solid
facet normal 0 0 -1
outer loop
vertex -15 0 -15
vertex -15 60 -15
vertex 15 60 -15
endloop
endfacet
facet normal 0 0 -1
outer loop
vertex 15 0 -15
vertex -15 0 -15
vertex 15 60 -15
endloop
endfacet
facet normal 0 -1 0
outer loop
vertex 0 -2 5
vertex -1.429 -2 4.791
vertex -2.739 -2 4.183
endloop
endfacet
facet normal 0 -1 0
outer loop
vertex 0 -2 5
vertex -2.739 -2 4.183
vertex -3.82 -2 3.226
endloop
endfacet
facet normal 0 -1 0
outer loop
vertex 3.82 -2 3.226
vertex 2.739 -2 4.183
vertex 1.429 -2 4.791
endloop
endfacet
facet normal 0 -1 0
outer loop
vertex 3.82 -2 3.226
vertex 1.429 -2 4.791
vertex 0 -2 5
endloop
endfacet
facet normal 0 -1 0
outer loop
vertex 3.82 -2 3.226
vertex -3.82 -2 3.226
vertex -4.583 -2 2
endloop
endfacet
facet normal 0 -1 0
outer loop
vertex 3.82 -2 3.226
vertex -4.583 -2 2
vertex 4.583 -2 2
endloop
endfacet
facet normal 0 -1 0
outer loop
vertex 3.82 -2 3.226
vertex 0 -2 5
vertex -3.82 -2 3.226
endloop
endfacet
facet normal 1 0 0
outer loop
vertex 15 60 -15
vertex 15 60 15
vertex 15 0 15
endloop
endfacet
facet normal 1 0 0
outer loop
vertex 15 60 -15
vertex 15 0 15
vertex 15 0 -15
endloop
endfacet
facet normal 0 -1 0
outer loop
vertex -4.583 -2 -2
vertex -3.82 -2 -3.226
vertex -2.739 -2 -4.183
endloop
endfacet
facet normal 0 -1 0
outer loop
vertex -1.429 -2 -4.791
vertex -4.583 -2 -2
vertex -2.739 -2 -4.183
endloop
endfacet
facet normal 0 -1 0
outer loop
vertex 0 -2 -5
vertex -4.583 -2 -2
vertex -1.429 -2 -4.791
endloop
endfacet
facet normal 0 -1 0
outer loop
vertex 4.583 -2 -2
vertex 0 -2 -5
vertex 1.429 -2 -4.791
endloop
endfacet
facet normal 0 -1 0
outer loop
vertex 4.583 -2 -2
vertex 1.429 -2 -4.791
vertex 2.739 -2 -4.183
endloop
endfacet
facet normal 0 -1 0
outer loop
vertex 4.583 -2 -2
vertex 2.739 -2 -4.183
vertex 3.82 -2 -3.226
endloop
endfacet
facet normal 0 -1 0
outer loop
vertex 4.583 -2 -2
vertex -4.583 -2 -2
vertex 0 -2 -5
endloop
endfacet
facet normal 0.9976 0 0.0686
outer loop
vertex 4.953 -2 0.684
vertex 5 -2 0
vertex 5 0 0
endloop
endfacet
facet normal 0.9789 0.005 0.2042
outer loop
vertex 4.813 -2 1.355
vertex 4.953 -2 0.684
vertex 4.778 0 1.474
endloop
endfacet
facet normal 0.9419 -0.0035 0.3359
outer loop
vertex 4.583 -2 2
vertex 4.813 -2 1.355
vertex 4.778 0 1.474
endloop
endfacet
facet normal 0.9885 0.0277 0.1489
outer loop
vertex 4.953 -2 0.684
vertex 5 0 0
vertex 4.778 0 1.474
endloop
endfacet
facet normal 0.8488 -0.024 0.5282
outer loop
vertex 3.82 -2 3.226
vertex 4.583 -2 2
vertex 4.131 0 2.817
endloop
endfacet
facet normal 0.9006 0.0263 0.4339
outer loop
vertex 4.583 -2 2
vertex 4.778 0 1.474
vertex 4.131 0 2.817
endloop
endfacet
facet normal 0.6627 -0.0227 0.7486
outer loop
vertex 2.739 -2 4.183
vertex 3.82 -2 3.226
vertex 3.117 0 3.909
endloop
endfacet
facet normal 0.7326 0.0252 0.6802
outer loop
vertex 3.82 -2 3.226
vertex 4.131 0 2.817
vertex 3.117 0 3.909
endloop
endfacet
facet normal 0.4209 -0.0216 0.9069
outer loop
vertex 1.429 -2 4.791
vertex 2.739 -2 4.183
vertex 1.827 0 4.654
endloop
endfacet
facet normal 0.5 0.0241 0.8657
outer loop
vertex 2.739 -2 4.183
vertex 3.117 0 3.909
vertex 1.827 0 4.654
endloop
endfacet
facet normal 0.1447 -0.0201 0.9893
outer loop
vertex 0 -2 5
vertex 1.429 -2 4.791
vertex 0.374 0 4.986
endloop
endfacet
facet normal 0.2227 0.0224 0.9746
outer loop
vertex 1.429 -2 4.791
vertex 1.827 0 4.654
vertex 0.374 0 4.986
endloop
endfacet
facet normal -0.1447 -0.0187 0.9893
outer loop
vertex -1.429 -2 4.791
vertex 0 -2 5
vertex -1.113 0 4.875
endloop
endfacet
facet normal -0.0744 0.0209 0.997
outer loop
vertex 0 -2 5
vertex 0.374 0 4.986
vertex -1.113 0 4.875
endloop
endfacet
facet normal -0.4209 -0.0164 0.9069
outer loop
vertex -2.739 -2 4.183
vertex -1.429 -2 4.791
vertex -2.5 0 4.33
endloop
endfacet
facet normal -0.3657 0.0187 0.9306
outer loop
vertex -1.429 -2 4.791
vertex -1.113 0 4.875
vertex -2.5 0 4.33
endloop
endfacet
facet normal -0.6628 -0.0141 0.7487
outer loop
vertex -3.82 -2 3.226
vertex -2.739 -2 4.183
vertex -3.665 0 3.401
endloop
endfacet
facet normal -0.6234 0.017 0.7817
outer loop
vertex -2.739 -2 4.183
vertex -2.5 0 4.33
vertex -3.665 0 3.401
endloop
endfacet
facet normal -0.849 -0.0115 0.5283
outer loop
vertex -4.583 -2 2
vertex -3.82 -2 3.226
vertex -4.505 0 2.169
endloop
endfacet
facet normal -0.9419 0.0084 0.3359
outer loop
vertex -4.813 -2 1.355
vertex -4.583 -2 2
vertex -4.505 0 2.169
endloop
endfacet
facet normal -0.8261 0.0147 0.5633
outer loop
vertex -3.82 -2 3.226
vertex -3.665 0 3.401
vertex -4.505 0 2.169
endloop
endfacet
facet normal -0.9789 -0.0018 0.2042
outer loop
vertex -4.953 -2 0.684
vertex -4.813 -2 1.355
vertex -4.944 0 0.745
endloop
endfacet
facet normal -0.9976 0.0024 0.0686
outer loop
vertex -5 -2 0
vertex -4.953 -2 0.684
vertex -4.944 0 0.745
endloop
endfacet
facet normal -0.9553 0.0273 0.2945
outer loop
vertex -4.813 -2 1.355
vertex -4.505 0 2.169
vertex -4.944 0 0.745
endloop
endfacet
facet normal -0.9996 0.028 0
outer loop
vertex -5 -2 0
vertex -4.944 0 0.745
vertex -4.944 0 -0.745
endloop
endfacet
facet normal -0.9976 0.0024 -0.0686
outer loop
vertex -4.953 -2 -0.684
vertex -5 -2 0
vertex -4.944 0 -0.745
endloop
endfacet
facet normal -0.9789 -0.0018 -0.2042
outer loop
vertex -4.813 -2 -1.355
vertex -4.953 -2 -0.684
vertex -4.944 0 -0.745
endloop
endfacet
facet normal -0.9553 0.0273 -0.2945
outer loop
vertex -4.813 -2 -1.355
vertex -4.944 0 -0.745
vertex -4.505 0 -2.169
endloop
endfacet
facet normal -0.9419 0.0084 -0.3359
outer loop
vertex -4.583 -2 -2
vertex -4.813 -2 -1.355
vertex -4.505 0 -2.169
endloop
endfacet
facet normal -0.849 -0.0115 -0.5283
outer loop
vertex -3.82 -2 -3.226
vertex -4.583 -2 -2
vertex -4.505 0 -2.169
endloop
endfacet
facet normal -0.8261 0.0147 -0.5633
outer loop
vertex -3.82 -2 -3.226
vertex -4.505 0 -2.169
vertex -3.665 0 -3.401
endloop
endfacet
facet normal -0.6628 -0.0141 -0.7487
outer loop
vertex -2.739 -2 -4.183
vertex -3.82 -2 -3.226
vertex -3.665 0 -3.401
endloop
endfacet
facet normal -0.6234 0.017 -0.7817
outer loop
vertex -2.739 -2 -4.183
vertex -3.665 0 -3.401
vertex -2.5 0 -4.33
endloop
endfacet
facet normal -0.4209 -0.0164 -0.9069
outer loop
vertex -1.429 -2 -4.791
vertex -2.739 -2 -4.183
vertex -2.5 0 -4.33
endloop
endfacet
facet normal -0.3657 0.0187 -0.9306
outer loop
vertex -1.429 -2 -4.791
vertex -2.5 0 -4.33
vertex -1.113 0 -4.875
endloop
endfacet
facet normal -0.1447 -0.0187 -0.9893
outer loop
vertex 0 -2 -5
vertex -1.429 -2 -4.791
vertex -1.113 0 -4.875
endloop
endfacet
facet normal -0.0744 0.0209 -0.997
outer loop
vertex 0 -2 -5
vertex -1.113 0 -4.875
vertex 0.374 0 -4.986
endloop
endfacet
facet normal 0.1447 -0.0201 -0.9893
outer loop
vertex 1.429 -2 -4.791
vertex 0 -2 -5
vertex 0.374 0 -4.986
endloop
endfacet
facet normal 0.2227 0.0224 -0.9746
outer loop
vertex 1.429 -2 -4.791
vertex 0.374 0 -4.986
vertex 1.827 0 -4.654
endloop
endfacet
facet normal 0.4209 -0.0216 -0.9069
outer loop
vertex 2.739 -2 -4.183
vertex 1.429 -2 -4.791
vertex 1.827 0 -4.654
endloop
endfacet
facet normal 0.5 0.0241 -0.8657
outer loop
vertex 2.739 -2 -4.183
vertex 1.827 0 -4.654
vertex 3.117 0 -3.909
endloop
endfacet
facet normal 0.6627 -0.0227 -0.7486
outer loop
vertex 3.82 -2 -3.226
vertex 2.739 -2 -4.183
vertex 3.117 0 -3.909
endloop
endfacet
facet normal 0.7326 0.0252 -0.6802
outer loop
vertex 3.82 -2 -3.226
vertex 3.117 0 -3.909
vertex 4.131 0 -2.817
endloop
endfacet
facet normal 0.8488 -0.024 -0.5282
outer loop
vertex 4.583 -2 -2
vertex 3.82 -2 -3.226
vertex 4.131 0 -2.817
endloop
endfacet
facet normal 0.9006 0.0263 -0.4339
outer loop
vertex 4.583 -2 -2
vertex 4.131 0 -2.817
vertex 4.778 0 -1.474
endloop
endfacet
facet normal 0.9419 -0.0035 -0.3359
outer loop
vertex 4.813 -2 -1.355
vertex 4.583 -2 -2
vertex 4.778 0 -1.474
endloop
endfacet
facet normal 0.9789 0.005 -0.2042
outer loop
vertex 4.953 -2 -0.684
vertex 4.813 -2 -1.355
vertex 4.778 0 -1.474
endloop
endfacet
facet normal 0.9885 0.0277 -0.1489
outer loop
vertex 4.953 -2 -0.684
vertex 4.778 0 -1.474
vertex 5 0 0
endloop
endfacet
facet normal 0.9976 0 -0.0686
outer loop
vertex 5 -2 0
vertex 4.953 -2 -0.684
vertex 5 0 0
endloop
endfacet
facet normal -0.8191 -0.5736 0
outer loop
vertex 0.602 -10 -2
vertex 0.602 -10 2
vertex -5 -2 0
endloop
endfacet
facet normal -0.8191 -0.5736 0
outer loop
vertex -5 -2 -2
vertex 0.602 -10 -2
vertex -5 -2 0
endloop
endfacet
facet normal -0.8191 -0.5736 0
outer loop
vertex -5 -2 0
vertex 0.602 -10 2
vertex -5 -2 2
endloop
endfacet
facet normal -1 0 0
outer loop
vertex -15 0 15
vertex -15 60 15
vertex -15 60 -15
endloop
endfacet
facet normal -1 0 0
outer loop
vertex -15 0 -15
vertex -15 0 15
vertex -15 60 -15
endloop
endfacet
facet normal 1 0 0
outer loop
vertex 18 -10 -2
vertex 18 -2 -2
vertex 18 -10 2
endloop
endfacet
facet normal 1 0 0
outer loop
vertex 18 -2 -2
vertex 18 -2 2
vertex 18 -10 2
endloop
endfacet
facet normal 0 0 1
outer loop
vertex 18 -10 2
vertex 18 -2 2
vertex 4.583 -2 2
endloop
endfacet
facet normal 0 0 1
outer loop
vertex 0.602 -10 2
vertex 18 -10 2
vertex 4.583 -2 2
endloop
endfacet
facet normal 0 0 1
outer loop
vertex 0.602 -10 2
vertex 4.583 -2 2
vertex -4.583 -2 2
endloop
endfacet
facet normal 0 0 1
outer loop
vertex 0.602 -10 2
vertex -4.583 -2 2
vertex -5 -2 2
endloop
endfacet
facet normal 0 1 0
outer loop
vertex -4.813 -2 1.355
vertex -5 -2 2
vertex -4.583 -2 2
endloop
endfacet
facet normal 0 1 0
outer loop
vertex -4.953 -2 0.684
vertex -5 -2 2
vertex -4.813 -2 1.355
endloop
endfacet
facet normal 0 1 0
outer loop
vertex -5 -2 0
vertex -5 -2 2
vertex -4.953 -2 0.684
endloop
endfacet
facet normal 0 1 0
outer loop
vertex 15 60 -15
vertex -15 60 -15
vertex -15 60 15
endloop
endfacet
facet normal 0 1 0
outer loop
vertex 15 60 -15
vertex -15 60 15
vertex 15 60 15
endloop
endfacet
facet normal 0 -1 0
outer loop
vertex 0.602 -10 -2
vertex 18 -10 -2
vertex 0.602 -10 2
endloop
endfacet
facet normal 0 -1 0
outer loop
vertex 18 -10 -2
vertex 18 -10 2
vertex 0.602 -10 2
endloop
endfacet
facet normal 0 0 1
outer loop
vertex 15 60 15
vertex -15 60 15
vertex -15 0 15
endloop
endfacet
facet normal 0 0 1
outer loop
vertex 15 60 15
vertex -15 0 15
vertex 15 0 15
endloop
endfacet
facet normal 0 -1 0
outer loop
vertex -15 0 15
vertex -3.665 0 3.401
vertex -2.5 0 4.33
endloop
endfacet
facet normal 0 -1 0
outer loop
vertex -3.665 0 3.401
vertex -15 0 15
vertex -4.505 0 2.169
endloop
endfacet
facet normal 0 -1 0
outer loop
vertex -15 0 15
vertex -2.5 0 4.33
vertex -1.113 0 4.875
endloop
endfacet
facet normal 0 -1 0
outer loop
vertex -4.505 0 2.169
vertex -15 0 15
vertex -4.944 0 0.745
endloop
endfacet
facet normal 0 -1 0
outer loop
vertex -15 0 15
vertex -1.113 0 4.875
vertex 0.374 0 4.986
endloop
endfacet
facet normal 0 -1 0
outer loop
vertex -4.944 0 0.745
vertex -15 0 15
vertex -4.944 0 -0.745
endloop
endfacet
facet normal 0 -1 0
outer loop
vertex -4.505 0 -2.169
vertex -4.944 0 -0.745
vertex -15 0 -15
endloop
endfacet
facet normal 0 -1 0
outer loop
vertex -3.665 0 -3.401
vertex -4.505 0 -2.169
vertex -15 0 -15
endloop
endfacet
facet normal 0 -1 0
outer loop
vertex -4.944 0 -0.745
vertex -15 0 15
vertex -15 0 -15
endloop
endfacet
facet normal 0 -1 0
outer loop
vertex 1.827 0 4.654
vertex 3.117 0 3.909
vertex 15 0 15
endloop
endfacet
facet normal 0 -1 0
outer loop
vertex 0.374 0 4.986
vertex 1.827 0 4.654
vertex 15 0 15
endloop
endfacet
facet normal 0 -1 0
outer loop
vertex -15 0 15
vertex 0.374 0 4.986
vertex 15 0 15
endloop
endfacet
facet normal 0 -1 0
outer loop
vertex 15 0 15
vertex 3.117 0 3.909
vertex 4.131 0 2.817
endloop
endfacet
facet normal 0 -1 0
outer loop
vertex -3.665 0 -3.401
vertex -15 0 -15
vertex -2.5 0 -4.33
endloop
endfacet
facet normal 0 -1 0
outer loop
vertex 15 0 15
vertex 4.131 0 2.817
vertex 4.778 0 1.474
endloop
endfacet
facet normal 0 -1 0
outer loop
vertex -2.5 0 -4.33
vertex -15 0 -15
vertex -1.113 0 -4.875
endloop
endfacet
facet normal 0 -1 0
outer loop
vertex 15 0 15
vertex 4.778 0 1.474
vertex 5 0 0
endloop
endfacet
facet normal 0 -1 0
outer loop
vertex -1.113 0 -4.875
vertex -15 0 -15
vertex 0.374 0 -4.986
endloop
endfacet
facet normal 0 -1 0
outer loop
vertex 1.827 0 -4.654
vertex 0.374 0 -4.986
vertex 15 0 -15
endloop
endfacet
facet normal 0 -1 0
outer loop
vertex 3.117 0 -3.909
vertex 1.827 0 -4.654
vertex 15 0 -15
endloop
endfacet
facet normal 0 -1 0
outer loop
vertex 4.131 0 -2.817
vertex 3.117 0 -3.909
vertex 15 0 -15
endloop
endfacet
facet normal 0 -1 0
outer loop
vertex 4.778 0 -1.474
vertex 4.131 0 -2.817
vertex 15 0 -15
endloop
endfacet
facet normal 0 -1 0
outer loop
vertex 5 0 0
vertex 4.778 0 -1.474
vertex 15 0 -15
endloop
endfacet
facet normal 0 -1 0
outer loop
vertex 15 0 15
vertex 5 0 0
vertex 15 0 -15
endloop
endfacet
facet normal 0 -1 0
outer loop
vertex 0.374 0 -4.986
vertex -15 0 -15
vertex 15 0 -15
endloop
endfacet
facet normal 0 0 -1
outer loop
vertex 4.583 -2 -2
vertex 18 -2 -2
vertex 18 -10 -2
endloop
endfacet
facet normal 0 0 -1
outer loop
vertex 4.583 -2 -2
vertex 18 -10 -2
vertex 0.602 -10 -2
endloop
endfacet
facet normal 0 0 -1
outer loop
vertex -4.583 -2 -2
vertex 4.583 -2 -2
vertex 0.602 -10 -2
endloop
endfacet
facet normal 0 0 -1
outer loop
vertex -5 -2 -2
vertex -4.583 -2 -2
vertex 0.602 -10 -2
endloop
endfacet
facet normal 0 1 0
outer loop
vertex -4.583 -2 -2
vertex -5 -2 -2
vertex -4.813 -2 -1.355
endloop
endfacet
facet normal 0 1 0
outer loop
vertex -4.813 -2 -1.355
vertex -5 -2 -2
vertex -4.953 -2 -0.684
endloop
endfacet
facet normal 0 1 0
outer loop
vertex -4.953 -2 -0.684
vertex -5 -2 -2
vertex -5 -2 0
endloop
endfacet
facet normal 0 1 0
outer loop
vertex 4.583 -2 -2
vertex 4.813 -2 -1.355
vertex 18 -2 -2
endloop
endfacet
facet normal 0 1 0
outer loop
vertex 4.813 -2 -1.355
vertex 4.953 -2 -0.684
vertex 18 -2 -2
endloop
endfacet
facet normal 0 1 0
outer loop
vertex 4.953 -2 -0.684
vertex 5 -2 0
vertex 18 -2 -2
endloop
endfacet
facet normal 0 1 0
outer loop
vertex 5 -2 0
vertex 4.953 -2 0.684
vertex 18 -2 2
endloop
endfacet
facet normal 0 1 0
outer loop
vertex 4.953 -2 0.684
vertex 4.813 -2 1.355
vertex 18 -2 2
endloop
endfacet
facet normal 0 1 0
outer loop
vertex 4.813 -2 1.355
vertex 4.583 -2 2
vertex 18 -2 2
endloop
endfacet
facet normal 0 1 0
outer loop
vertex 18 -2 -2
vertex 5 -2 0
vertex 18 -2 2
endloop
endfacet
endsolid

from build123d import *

# Parameters (mm, degrees)
SKETCH1_W                = 30
SKETCH1_H                = 30
BOSS_EXTRUDE1_DEPTH      = 60
SKETCH2_R                = 5
BOSS_EXTRUDE2_DEPTH      = 2
BOSS_EXTRUDE3_DEPTH      = 2
BOSS_EXTRUDE3_DEPTH_BACK = 2


with BuildPart() as part:
    # Sketch1 → Boss-Extrude1 (new body)
    with BuildSketch(Plane(origin=(0, 0, 0), x_dir=(1, 0, 0), z_dir=(0, 1, 0))):
        Rectangle(SKETCH1_W, SKETCH1_H)
    extrude(amount=BOSS_EXTRUDE1_DEPTH)

    # Sketch2 → Boss-Extrude2 (add)
    with BuildSketch(Plane.XZ):
        Circle(SKETCH2_R)
    extrude(amount=BOSS_EXTRUDE2_DEPTH)

    # Sketch4 → Boss-Extrude3 (add, two sides)
    with BuildSketch(Plane.XY) as boss_extrude3_sk:
        Polygon((-5, -2), (18, -2), (18, -10), (0.601660306, -10), align=None)
    extrude(amount=BOSS_EXTRUDE3_DEPTH)
    extrude(boss_extrude3_sk.sketch, amount=-BOSS_EXTRUDE3_DEPTH_BACK)


solid = part.part
